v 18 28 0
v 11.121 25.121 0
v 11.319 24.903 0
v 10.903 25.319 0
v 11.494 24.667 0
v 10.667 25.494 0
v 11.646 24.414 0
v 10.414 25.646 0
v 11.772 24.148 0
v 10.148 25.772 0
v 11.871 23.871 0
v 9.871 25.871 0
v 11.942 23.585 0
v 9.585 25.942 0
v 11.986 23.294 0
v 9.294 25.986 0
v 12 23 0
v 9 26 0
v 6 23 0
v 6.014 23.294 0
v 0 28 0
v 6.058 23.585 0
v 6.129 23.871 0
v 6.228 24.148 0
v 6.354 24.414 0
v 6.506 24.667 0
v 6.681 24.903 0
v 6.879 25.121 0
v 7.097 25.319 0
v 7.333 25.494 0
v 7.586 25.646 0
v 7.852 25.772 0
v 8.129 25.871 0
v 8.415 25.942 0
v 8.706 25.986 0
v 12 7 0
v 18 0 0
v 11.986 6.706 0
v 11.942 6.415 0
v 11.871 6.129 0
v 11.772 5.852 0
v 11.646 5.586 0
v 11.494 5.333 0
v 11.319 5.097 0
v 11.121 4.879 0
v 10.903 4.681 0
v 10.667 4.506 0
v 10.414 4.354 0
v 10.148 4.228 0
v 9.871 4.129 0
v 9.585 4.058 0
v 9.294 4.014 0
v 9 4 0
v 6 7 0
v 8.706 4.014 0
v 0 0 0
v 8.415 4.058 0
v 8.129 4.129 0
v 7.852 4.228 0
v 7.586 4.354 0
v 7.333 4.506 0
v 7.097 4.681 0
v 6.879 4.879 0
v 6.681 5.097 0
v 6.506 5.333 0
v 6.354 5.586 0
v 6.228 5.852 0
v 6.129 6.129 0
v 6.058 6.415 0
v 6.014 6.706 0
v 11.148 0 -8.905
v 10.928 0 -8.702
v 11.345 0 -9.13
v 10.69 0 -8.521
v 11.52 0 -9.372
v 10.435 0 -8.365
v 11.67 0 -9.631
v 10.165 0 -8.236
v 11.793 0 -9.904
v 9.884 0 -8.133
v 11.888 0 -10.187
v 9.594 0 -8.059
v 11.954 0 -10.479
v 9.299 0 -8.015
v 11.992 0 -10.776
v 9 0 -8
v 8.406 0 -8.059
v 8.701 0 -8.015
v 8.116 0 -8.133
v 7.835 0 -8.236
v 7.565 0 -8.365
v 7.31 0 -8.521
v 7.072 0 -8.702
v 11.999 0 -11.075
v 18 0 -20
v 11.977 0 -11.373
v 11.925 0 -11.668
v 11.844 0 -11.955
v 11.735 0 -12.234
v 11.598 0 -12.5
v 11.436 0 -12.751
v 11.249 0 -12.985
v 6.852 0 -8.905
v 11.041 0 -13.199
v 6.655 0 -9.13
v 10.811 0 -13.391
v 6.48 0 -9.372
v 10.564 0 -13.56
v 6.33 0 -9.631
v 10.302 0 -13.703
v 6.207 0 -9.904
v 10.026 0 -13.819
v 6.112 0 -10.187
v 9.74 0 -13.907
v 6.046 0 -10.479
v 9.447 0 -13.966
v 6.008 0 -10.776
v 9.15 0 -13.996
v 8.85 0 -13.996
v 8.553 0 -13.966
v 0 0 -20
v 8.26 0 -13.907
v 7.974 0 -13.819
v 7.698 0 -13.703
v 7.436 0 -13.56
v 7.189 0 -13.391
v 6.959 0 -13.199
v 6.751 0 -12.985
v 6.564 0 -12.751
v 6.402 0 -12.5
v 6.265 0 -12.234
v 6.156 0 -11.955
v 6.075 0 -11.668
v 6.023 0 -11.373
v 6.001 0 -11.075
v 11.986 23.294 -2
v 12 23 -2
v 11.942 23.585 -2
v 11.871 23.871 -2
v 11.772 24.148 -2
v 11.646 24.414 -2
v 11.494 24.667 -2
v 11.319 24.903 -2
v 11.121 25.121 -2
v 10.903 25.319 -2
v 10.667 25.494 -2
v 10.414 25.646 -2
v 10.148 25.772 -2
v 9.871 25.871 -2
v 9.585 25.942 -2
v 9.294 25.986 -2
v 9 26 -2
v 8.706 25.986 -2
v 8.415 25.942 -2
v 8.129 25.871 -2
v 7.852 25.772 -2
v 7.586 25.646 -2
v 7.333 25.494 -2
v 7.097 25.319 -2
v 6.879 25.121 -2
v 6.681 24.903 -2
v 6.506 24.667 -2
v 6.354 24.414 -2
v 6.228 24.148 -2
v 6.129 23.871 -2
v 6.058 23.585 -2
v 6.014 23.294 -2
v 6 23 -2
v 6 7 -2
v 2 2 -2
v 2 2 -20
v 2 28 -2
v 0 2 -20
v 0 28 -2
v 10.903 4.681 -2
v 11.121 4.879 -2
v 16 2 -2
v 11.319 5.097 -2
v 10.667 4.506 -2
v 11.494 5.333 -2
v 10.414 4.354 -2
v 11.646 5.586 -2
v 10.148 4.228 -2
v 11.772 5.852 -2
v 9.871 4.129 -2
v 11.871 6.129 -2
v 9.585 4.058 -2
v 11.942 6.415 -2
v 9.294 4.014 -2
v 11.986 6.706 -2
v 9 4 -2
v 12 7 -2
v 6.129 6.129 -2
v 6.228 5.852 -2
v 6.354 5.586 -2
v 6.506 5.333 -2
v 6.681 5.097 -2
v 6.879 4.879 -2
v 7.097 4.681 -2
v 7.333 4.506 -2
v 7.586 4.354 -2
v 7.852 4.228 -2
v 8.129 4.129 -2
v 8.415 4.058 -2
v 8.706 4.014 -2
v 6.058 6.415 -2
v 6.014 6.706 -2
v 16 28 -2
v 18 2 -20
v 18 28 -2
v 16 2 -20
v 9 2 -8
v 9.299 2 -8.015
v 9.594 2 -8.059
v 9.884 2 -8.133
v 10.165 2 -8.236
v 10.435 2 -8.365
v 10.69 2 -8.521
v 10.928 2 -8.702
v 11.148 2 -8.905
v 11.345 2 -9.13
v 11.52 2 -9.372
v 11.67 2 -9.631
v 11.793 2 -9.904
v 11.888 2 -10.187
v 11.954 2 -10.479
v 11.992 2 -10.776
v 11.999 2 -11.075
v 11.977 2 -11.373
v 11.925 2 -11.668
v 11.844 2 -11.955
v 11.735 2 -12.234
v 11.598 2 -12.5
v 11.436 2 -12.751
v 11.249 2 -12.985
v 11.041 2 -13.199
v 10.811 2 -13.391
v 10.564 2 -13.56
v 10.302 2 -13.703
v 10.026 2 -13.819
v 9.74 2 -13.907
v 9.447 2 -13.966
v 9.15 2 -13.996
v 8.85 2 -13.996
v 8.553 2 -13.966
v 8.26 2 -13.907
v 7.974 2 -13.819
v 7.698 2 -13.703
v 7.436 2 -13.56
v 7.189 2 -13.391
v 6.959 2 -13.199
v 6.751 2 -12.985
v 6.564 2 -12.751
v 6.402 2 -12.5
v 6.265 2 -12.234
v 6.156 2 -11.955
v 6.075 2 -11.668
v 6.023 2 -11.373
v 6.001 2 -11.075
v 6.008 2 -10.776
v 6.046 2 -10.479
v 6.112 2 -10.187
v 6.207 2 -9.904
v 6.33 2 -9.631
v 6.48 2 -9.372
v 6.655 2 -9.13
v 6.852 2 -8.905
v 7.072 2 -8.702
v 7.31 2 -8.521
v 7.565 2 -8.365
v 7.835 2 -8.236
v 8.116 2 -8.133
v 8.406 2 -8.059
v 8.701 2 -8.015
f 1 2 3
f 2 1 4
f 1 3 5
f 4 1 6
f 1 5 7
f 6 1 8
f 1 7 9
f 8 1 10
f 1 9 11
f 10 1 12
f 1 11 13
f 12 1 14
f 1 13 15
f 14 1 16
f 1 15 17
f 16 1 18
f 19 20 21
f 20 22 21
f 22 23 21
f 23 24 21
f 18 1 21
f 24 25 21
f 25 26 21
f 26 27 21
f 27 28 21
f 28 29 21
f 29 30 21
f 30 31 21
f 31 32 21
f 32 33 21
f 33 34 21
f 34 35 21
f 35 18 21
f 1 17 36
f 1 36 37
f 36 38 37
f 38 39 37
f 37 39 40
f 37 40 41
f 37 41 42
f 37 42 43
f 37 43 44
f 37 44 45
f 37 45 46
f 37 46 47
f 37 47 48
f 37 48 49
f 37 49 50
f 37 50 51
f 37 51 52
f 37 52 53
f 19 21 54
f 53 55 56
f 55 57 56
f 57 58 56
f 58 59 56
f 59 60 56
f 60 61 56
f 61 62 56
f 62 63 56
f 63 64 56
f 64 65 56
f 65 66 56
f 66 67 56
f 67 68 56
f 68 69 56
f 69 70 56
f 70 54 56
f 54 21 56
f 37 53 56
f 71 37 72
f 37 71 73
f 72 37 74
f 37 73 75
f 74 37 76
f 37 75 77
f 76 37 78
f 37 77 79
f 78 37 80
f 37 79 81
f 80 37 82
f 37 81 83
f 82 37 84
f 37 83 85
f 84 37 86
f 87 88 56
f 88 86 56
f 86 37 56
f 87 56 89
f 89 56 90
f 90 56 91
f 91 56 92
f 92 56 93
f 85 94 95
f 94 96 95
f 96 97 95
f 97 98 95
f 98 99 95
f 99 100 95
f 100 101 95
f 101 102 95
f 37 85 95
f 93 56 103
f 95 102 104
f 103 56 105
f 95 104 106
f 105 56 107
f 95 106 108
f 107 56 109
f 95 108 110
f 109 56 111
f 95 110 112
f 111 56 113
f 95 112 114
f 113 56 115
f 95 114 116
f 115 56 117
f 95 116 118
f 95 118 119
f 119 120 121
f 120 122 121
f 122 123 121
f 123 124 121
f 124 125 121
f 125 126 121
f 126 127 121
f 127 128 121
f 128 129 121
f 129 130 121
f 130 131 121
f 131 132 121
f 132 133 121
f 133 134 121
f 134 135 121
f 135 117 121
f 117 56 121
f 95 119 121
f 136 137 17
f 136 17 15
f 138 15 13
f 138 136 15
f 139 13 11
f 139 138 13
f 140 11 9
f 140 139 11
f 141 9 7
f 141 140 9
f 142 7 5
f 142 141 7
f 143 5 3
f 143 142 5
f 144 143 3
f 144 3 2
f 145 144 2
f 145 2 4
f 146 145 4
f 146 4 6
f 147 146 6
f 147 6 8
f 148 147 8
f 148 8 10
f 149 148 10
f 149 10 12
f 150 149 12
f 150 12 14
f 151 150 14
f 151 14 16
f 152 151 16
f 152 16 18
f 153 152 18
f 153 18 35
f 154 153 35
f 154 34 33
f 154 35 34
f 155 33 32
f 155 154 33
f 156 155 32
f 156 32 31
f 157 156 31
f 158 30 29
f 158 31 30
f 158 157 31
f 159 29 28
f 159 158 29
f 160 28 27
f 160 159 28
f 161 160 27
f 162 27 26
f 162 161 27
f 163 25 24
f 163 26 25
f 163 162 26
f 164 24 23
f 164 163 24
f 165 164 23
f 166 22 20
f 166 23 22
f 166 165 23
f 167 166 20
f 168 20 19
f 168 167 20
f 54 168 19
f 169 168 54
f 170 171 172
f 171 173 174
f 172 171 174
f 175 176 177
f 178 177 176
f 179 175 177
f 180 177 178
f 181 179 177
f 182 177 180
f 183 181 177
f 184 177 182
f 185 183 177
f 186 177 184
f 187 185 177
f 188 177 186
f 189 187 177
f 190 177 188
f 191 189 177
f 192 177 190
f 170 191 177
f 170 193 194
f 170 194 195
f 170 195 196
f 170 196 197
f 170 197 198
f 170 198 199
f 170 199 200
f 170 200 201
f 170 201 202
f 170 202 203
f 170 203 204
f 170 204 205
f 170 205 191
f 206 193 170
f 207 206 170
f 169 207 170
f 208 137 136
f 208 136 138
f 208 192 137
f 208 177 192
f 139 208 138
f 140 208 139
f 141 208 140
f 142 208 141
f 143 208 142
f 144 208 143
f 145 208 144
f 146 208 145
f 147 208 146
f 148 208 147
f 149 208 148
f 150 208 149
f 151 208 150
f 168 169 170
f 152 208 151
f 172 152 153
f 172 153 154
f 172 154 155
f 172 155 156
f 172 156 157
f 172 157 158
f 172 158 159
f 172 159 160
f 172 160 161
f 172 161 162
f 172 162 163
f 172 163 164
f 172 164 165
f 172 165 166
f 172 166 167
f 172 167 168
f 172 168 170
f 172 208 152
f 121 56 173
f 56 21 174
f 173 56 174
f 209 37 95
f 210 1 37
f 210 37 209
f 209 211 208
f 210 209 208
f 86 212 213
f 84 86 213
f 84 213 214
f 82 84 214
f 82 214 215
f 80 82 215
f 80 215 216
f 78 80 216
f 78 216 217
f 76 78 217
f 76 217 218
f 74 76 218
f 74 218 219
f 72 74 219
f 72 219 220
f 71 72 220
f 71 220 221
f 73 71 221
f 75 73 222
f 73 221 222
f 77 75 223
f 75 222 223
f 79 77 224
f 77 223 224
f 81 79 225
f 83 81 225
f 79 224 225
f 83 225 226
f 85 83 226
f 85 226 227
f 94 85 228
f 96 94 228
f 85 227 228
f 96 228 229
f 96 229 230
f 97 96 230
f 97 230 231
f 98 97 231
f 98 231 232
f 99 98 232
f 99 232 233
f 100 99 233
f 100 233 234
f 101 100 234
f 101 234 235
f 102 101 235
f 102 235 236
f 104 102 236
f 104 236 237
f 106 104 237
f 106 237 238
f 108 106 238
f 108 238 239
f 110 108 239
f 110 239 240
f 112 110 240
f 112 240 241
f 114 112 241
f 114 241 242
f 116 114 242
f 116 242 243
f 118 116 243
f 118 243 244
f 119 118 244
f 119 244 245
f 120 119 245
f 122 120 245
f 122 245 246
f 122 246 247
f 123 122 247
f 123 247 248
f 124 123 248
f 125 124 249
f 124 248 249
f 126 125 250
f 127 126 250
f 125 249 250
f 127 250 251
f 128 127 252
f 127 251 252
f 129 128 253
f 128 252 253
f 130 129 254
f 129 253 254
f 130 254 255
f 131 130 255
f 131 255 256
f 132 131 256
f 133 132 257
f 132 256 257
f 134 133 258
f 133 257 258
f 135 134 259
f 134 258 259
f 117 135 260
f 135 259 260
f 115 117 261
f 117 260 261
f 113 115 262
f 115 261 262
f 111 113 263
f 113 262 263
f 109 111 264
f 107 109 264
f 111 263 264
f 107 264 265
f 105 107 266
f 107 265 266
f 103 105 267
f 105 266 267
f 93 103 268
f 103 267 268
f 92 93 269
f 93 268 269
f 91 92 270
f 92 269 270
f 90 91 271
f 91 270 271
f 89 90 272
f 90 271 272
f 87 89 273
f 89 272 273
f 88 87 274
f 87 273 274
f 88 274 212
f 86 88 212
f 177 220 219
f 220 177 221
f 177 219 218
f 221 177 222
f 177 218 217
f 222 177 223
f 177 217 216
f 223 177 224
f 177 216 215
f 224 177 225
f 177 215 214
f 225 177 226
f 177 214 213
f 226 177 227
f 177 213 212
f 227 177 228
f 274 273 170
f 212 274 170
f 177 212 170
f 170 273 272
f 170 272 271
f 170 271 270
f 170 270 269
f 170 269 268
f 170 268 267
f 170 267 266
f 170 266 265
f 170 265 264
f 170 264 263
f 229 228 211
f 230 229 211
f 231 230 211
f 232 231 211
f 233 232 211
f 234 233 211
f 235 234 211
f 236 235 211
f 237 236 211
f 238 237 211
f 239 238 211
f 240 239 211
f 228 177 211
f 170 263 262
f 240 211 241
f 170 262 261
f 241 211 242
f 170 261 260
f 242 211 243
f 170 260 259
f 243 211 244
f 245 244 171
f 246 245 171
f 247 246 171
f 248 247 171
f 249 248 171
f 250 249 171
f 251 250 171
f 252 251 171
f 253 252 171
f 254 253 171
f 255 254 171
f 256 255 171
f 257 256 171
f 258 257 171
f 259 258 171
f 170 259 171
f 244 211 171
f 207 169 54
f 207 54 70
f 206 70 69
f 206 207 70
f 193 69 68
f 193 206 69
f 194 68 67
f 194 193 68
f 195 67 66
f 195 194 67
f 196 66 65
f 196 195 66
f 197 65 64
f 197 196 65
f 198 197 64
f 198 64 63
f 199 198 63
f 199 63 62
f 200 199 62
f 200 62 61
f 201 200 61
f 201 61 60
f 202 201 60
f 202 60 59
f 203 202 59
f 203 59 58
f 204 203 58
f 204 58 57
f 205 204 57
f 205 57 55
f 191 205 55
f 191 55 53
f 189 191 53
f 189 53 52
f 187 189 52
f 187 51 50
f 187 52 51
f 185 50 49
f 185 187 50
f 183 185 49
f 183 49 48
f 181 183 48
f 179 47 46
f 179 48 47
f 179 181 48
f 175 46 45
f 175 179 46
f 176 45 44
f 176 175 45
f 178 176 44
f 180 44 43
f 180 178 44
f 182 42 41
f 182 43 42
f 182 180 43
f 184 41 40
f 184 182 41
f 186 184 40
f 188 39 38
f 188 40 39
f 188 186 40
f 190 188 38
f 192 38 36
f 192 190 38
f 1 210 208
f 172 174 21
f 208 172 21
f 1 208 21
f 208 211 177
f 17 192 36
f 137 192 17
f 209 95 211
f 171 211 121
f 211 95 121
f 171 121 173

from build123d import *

# Parameters (mm, degrees)
EXTRUDE_1_DEPTH     = 18
SKETCH_2_W          = 14
SKETCH_2_H          = 26
CUT_EXTRUDE_1_DEPTH = 18
CUT_EXTRUDE_2_DEPTH = 18
SKETCH_4_R          = 3
CUT_EXTRUDE_3_DEPTH = 18


with BuildPart() as part:
    # 스케치1 → 보스-돌출1 (new body)
    with BuildSketch(Plane(origin=(0, 0, 0), x_dir=(0, 0, -1), z_dir=(1, 0, 0))):
        Polygon((0, 0), (20, 0), (20, 2), (2, 28), (0, 28), align=None)
    extrude(amount=EXTRUDE_1_DEPTH)

    # 스케치2 → 컷-돌출1 (cut)
    with BuildSketch(Plane(origin=(0, 0, -20), x_dir=(-1, 0, 0), z_dir=(0, 0, -1))):
        with Locations((-9, 15)):
            Rectangle(SKETCH_2_W, SKETCH_2_H)
    extrude(amount=-CUT_EXTRUDE_1_DEPTH, mode=Mode.SUBTRACT)

    # 스케치3 → 컷-돌출2 (cut)
    with BuildSketch(Plane(origin=(0, 0, -2), x_dir=(-1, 0, 0), z_dir=(0, 0, -1))):
        with BuildLine():
            Line((-6, 23), (-6, 7))
            ThreePointArc((-6, 7), (-9, 4), (-12, 7))
            Line((-12, 7), (-12, 23))
            ThreePointArc((-12, 23), (-9, 26), (-6, 23))
        make_face()
    extrude(amount=-CUT_EXTRUDE_2_DEPTH, mode=Mode.SUBTRACT)

    # 스케치4 → 컷-돌출3 (cut)
    with BuildSketch(Plane(origin=(0, 2, 0), x_dir=(1, 0, 0), z_dir=(0, 1, 0))):
        with Locations(Location((9, 11, 0), (0, 0, 270))):
            Circle(SKETCH_4_R)
    extrude(amount=-CUT_EXTRUDE_3_DEPTH, mode=Mode.SUBTRACT)


solid = part.part
